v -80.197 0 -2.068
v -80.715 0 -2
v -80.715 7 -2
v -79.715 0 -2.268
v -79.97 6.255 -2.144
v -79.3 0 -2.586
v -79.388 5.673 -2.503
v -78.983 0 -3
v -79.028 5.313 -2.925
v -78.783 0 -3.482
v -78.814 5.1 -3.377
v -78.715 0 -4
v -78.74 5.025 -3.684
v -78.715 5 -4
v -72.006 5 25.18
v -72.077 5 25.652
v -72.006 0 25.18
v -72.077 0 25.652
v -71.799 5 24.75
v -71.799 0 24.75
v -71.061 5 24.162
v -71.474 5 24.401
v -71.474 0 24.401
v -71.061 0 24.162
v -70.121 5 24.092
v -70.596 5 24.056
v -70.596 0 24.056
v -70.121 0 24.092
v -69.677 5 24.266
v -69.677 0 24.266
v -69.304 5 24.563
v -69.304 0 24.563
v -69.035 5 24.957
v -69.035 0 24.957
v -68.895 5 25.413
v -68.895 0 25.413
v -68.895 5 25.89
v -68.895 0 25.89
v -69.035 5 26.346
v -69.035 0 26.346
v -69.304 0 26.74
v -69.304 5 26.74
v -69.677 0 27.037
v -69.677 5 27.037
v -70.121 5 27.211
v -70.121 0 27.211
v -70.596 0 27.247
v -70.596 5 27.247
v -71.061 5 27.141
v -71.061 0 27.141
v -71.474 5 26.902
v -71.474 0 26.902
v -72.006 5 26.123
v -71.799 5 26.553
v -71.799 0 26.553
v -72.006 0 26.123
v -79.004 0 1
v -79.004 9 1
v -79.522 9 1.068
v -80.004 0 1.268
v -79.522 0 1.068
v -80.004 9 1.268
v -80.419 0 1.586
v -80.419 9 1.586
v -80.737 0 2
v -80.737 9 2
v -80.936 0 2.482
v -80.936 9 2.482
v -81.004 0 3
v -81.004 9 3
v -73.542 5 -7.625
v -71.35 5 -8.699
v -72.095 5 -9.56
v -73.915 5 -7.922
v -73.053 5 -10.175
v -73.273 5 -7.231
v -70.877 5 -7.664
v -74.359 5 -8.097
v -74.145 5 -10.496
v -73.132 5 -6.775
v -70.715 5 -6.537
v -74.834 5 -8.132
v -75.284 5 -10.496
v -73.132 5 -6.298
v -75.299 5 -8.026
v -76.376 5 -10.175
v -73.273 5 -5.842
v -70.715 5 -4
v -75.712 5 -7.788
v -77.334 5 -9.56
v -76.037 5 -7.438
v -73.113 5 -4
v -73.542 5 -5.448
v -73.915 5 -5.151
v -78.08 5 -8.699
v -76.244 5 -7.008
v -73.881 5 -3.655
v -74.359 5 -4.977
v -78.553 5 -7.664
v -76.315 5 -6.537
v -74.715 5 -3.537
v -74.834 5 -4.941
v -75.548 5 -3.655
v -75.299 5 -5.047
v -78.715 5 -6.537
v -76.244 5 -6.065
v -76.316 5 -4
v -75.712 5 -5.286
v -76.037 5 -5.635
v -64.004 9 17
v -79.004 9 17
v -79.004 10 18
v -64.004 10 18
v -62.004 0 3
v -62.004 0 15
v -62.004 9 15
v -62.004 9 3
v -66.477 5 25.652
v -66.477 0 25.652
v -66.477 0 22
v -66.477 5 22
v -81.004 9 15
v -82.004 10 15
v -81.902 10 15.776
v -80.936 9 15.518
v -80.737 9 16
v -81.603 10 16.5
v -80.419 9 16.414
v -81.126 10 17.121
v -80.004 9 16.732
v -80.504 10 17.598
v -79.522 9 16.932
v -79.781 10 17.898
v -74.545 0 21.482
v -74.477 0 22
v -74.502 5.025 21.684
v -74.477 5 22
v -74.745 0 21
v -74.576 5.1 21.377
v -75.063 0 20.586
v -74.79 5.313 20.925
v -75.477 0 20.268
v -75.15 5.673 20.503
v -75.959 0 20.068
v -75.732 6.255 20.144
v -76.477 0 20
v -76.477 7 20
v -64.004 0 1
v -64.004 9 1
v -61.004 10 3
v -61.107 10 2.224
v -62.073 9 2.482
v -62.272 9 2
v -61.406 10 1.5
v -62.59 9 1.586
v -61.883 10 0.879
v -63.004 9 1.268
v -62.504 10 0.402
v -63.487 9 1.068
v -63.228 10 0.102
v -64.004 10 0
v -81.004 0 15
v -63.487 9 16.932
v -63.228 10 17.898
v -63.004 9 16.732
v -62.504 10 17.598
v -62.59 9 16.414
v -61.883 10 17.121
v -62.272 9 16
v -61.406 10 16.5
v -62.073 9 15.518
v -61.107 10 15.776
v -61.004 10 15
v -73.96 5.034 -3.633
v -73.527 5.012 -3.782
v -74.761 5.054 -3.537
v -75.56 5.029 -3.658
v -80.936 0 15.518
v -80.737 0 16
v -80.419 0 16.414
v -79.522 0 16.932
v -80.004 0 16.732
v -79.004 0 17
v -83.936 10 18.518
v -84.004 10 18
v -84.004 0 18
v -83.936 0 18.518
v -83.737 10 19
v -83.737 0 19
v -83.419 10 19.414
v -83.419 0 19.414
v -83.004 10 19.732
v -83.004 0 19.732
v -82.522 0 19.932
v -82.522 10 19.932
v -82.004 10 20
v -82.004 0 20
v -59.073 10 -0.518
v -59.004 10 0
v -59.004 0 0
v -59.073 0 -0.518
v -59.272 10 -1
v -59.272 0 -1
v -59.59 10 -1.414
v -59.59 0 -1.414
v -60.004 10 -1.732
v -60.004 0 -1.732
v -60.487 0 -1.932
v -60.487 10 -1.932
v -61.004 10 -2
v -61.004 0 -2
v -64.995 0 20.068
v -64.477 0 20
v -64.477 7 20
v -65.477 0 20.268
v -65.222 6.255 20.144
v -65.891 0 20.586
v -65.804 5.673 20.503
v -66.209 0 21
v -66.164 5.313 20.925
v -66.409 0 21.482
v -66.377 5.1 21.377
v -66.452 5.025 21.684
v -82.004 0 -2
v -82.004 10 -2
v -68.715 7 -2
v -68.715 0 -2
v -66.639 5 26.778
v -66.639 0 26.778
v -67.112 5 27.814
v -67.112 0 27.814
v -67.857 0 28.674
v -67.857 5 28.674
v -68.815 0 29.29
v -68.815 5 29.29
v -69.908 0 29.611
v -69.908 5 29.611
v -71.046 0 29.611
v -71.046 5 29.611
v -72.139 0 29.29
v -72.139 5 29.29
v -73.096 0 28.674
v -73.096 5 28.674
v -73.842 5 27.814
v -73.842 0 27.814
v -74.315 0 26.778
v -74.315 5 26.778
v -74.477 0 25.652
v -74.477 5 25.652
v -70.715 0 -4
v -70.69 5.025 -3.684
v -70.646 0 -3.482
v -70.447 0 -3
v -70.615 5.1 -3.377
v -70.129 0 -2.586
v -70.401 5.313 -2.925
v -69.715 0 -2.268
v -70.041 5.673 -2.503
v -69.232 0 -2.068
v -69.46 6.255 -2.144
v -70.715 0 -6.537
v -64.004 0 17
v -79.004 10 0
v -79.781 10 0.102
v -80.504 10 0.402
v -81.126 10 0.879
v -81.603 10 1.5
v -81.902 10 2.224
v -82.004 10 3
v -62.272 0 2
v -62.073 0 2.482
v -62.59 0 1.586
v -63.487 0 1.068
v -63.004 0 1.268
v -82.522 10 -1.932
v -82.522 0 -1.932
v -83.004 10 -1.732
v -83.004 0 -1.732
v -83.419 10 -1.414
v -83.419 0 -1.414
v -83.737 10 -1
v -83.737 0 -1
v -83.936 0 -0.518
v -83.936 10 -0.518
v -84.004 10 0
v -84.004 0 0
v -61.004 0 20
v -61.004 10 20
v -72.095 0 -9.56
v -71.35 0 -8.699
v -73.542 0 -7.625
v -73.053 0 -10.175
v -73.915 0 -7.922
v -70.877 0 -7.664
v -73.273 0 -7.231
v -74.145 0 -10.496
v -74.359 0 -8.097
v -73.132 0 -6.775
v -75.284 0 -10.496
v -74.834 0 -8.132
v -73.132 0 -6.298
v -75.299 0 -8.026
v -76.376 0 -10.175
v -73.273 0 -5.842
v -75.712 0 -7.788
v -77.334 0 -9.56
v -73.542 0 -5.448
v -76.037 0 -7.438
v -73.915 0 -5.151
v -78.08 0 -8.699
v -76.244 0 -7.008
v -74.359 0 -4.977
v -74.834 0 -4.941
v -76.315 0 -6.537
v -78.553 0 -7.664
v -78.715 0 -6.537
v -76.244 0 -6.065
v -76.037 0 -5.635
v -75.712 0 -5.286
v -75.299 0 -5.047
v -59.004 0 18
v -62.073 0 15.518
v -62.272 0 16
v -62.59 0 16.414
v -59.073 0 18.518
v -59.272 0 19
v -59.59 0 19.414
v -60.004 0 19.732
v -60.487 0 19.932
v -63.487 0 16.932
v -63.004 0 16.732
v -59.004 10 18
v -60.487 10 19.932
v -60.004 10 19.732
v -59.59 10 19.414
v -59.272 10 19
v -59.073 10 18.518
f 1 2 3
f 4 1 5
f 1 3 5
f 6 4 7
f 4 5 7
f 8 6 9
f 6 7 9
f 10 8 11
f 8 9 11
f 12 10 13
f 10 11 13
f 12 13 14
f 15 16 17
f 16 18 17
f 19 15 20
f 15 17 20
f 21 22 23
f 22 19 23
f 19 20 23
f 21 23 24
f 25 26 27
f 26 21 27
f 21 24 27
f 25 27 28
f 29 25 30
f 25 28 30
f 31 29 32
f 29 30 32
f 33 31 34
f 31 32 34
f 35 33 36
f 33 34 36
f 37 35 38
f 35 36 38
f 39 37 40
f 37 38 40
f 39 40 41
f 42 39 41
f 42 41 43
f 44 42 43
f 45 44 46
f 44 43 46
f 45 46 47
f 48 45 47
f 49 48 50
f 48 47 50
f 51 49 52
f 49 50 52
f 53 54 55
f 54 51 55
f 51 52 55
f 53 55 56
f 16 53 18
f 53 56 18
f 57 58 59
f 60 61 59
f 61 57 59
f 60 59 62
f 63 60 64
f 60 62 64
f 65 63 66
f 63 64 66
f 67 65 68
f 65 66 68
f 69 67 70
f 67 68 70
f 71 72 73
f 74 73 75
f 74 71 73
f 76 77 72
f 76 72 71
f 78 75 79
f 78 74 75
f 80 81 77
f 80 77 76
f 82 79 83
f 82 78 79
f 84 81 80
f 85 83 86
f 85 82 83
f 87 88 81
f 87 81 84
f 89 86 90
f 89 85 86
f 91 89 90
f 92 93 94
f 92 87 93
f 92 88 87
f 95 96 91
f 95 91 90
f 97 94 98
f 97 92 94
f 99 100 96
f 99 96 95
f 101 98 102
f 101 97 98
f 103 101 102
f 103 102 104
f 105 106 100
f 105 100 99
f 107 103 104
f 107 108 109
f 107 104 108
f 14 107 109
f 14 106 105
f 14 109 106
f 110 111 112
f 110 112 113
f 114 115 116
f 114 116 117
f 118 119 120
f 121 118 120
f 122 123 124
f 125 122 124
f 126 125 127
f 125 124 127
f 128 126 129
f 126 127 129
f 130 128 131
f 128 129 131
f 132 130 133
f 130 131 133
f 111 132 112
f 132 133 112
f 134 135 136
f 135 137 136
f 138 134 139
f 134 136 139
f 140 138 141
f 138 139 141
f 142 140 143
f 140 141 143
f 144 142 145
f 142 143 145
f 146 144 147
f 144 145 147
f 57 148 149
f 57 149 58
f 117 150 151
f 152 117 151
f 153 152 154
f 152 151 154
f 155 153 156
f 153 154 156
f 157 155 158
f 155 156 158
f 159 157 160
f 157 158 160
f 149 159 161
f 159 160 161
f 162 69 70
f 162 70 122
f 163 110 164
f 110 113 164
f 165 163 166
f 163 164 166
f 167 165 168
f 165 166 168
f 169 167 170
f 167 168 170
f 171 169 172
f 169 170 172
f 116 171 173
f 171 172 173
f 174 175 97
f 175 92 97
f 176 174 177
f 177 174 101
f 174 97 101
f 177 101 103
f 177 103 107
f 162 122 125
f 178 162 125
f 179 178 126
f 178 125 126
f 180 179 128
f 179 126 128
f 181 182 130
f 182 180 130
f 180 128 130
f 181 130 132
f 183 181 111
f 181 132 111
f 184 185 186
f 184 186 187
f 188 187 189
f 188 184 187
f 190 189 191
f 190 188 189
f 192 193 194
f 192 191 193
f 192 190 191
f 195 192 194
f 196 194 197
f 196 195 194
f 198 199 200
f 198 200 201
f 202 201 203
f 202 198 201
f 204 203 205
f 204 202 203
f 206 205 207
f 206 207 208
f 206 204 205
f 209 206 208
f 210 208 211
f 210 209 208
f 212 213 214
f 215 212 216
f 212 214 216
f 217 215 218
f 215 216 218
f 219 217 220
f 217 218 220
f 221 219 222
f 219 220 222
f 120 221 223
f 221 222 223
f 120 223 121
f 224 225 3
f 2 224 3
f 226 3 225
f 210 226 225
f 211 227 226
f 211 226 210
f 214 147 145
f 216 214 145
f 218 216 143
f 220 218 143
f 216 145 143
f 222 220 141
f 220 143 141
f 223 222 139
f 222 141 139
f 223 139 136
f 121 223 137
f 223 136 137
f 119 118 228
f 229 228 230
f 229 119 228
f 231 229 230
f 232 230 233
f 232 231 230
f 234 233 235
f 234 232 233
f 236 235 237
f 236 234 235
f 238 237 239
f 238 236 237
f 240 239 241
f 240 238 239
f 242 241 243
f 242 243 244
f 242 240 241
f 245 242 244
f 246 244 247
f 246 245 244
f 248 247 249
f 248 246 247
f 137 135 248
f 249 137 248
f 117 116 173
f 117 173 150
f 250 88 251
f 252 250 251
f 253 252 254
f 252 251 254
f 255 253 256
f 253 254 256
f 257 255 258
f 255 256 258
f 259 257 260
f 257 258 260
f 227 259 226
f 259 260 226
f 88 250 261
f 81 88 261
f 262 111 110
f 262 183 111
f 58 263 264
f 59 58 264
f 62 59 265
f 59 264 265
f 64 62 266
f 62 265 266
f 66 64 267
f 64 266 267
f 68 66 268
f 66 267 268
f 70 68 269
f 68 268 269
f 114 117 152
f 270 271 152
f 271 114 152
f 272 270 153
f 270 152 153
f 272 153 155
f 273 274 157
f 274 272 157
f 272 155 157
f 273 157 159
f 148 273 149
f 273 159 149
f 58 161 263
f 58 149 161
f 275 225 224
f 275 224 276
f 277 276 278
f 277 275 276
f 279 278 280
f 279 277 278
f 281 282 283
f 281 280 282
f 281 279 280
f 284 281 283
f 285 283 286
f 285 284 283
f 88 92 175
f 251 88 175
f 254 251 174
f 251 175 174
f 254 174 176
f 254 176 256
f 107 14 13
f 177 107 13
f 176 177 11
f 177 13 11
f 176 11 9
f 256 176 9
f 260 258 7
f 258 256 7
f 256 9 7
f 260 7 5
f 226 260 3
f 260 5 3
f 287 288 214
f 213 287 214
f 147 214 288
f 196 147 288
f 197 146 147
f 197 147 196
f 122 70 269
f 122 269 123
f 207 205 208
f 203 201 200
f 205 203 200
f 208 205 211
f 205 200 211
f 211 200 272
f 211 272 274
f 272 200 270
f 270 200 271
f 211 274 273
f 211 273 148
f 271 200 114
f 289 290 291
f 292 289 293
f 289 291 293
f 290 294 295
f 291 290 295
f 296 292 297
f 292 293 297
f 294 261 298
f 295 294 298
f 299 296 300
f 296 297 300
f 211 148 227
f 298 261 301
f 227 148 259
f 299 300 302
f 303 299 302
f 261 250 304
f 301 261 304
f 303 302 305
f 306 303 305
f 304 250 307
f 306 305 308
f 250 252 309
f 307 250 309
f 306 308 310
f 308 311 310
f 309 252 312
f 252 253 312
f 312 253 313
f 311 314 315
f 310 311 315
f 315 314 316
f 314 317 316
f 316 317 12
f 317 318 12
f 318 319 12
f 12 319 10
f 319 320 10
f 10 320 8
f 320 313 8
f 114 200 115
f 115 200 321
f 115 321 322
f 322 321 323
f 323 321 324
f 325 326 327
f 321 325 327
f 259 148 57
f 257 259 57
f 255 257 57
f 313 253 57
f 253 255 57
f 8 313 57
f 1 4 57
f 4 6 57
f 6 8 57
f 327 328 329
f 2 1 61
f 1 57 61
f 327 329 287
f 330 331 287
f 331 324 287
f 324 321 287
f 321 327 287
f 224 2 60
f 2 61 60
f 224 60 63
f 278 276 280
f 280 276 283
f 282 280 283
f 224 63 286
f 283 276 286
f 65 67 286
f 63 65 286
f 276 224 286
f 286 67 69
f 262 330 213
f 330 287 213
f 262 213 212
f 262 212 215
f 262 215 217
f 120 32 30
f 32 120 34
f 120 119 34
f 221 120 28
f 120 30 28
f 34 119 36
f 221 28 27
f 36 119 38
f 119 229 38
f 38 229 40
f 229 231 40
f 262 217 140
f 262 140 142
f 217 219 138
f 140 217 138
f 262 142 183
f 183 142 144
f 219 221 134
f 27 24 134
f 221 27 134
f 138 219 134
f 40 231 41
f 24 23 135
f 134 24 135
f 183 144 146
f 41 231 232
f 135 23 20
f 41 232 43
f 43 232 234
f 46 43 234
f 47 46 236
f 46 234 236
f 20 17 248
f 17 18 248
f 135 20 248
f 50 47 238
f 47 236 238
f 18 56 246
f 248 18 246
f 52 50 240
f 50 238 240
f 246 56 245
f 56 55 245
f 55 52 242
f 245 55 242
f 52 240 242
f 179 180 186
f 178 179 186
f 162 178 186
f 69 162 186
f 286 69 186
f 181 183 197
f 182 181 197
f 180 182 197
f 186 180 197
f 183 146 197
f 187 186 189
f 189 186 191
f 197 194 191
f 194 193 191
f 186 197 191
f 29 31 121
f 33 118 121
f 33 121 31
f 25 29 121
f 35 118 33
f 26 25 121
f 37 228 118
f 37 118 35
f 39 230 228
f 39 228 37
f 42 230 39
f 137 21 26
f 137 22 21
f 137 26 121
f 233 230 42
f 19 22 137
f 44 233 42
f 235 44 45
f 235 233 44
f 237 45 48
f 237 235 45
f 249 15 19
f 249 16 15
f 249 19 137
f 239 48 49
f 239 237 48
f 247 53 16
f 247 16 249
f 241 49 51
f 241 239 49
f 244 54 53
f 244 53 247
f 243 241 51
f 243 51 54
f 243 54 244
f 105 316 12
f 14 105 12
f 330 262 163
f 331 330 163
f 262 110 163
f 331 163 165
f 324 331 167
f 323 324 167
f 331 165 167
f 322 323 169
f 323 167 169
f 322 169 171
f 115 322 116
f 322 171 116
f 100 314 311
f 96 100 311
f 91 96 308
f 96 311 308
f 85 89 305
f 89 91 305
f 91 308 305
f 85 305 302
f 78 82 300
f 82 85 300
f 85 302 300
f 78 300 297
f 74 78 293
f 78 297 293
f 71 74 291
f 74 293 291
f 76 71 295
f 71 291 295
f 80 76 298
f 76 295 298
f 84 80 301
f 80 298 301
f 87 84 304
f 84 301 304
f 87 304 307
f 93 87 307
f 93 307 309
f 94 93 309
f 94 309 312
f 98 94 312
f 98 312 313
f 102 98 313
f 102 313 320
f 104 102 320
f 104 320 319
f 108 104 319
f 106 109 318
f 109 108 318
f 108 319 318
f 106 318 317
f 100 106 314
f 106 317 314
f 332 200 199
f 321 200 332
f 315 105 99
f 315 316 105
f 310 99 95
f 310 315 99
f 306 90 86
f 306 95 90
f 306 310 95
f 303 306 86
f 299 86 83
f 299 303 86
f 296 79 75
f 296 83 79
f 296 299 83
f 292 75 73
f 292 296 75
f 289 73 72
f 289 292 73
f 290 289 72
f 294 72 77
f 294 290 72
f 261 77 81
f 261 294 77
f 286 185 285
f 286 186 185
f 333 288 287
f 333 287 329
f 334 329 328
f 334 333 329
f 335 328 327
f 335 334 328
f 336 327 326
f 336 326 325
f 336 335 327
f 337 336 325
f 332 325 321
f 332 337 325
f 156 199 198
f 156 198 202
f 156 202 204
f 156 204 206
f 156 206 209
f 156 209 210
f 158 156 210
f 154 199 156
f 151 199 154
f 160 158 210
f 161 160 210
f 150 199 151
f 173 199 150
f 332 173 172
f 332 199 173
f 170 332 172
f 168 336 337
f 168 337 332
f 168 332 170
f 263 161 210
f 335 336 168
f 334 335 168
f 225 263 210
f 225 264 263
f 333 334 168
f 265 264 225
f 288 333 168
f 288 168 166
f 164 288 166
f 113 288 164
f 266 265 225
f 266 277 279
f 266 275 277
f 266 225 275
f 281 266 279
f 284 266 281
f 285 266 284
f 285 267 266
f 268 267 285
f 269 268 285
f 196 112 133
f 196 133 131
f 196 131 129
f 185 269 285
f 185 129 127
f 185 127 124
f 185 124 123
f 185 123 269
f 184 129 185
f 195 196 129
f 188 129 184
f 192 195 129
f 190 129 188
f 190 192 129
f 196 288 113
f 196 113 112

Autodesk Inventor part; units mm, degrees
ref_plane "YZ Plane" through (0, 0, 0) normal (1, 0, 0) x (0, 1, 0)
ref_plane "XZ Plane" through (0, 0, 0) normal (0, 1, 0) x (-1, 0, 0)
ref_plane "XY Plane" through (0, 0, 0) normal (0, 0, 1) x (1, 0, 0)
sketch "Skizze1" plane through (0, 0, 0) normal (0, 1, 0) x (-1, 0, 0)
  line L0 (19.0016, 59.2215) -> (57.3401, 24.0908)
  arc A0 (57.3401, 24.0908) -> (69.3003, 22.9246) centre (64.096, 31.4636) ccw
  arc A1 (75.2406, 20.5635) -> (69.3003, 22.9246) centre (71.3821, 19.509) ccw
  arc A2 (77.999, -0.3892) -> (75.2406, 20.5635) centre (0, 0) ccw
  arc A3 (72.8723, -4.2072) -> (77.999, -0.3892) centre (73.9991, -0.3692) ccw
  arc A4 (72.8723, -4.2072) -> (61.6214, -8.4293) centre (70.0553, -13.8022) ccw
  line L1 (61.6214, -8.4293) -> (37.5911, -46.1492)
  arc A5 (34.2176, -48) -> (37.5911, -46.1492) centre (34.2176, -44) ccw
  line L2 (34.2176, -48) -> (29, -48)
  arc A6 (29, -48) -> (25.0078, -51.75) centre (29, -52) ccw
  arc A7 (21.0156, -55.5) -> (25.0078, -51.75) centre (21.0156, -51.5) ccw
  line L3 (21.0156, -55.5) -> (-21.0156, -55.5)
  circle A8 centre (36.75, -68) radius 1.8
  circle A9 centre (36.75, -61) radius 1.8
  circle A10 centre (36.75, -54) radius 1.8
  line L4 (30.1812, 62.5407) -> (59.6723, 35.5171)
  arc A11 (59.6723, 35.5171) -> (68.1495, 35.8873) centre (63.7258, 39.9408) ccw
  line L5 (68.1495, 35.8873) -> (74.1043, 42.3858)
  arc A12 (77.3365, 41.9889) -> (74.1043, 42.3858) centre (75.5788, 41.0346) ccw
  arc A13 (85.5688, -20.542) -> (77.3365, 41.9889) centre (0, 0) ccw
  arc A14 (82.5495, -21.7619) -> (85.5688, -20.542) centre (83.6241, -20.0751) ccw
  line L6 (82.5495, -21.7619) -> (75.1157, -17.026)
  arc A15 (75.1157, -17.026) -> (66.8315, -18.8626) centre (71.8919, -22.0864) ccw
  line L7 (66.8315, -18.8626) -> (45.3395, -52.5983)
  arc A16 (45.3395, -52.5983) -> (47.1761, -60.8824) centre (50.3999, -55.8221) ccw
  line L8 (47.1761, -60.8824) -> (54.6099, -65.6183)
  arc A17 (54.7803, -68.8703) -> (54.6099, -65.6183) centre (53.5353, -67.3051) ccw
  arc A18 (44.8368, -75.7209) -> (54.7803, -68.8703) centre (0, 0) ccw
  arc A19 (43.8178, -76) -> (44.8368, -75.7209) centre (43.8178, -74) ccw
  line L9 (43.8178, -76) -> (35.75, -76)
  arc A20 (33.75, -74) -> (35.75, -76) centre (35.75, -74) ccw
  line L10 (33.75, -74) -> (33.75, -64)
  arc A21 (33.75, -64) -> (30.0179, -63) centre (31.75, -64) ccw
  arc A22 (28.2859, -64) -> (30.0179, -63) centre (28.2859, -62) ccw
  line L11 (28.2859, -64) -> (14.7321, -64)
  circle A23 centre (49.9686, 39.6617) radius 1.8
  circle A24 centre (55.4982, 34.5948) radius 1.8
  circle A25 centre (58.5312, -25.3775) radius 1.8
  circle A26 centre (54.5014, -31.7029) radius 1.8
  circle A27 centre (62.5609, -19.052) radius 1.8
  line L12 (37.1695, -45.8805) -> (61.1997, -8.1606)
  arc A28 (73.0131, -3.7275) -> (61.1997, -8.1606) centre (70.0553, -13.8022) ccw
  arc A29 (73.0131, -3.7275) -> (77.499, -0.3867) centre (73.9991, -0.3692) ccw
  arc A30 (77.499, -0.3867) -> (74.7582, 20.4317) centre (0, 0) ccw
  arc A31 (74.7582, 20.4317) -> (69.5605, 22.4976) centre (71.3821, 19.509) ccw
  arc A32 (57.0023, 23.7222) -> (69.5605, 22.4976) centre (64.096, 31.4636) ccw
  line L13 (57.0023, 23.7222) -> (18.6638, 58.8529)
  line L14 (-21.0156, -55) -> (21.0156, -55)
  arc A33 (21.0156, -55) -> (24.5088, -51.7188) centre (21.0156, -51.5) ccw
  arc A34 (29, -47.5) -> (24.5088, -51.7188) centre (29, -52) ccw
  line L15 (29, -47.5) -> (34.2176, -47.5)
  arc A35 (34.2176, -47.5) -> (37.1695, -45.8805) centre (34.2176, -44) ccw
  line L16 (47.604, 37.0813) -> (31.5682, 51.7754)
  line L17 (31.5682, 51.7754) -> (63.6398, 22.3872)
  line L18 (63.6398, 22.3872) -> (50.128, 7.6416)
  line L19 (47.3023, 7.5183) -> (18.1798, 34.2041)
  line L20 (18.0564, 37.0298) -> (31.5682, 51.7754)
  line L21 (58.5312, -25.3775) -> (55.5793, -23.4969)
  line L22 (55.5793, -23.4969) -> (67.2656, -5.1532)
  line L23 (67.2656, -5.1532) -> (43.893, -41.8407)
  line L24 (43.893, -41.8407) -> (27.0252, -31.0947)
  line L25 (26.413, -28.3333) -> (47.6364, 4.9806)
  line L26 (50.3977, 5.5928) -> (67.2656, -5.1532)
  arc A36 (50.3977, 5.5928) -> (47.6364, 4.9806) centre (49.3231, 3.906) ccw
  arc A37 (47.3023, 7.5183) -> (50.128, 7.6416) centre (48.6535, 8.9928) ccw
  arc A38 (26.413, -28.3333) -> (27.0252, -31.0947) centre (28.0998, -29.4079) ccw
  line L27 (81.0045, 17) -> (62.0045, 17)
  line L28 (62.0045, 17) -> (62.0045, 1)
  line L29 (62.0045, 1) -> (81.0045, 1)
  line L30 (81.0045, 1) -> (81.0045, 17)
  line L31 (81.0045, 17) -> (62.0045, 1) construction
  line L32 (62.0045, 17) -> (81.0045, 1) construction
  arc A39 (-37.5911, -46.1492) -> (-34.2176, -48) centre (-34.2176, -44) ccw
  line L33 (-37.5911, -46.1492) -> (-61.6214, -8.4293)
  arc A40 (-61.6214, -8.4293) -> (-72.8723, -4.2072) centre (-70.0553, -13.8022) ccw
  arc A41 (-77.999, -0.3892) -> (-72.8723, -4.2072) centre (-73.9991, -0.3692) ccw
  arc A42 (-75.2406, 20.5635) -> (-77.999, -0.3892) centre (0, 0) ccw
  arc A43 (-69.3003, 22.9246) -> (-75.2406, 20.5635) centre (-71.3821, 19.509) ccw
  arc A44 (-69.3003, 22.9246) -> (-57.3401, 24.0908) centre (-64.096, 31.4636) ccw
  line L34 (-57.3401, 24.0908) -> (-19.0016, 59.2215)
  arc A45 (-19.0016, 59.2215) -> (-16.7974, 71.0346) centre (-25.7575, 66.5943) ccw
  arc A46 (-13.9276, 76.7465) -> (-16.7974, 71.0346) centre (-13.2134, 72.8108) ccw
  arc A47 (13.9276, 76.7465) -> (-13.9276, 76.7465) centre (0, 0) ccw
  arc A48 (16.7974, 71.0346) -> (13.9276, 76.7465) centre (13.2134, 72.8108) ccw
  arc A49 (16.7974, 71.0346) -> (19.0016, 59.2215) centre (25.7575, 66.5943) ccw
  line L35 (19.0016, 59.2215) -> (57.3401, 24.0908)
  arc A50 (57.3401, 24.0908) -> (69.3003, 22.9246) centre (64.096, 31.4636) ccw
  arc A51 (75.2406, 20.5635) -> (69.3003, 22.9246) centre (71.3821, 19.509) ccw
  arc A52 (77.999, -0.3892) -> (75.2406, 20.5635) centre (0, 0) ccw
  arc A53 (72.8723, -4.2072) -> (77.999, -0.3892) centre (73.9991, -0.3692) ccw
  arc A54 (72.8723, -4.2072) -> (61.6214, -8.4293) centre (70.0553, -13.8022) ccw
  line L36 (61.6214, -8.4293) -> (37.5911, -46.1492)
  arc A55 (34.2176, -48) -> (37.5911, -46.1492) centre (34.2176, -44) ccw
  line L37 (34.2176, -48) -> (29, -48)
  arc A56 (29, -48) -> (25.0078, -51.75) centre (29, -52) ccw
  arc A57 (21.0156, -55.5) -> (25.0078, -51.75) centre (21.0156, -51.5) ccw
  line L38 (21.0156, -55.5) -> (-21.0156, -55.5)
  arc A58 (-25.0078, -51.75) -> (-21.0156, -55.5) centre (-21.0156, -51.5) ccw
  arc A59 (-25.0078, -51.75) -> (-29, -48) centre (-29, -52) ccw
  line L39 (-29, -48) -> (-34.2176, -48)
  circle A60 centre (-24.9586, 79.1585) radius 2.8
  circle A61 centre (-76.682, 31.7627) radius 2.8
  circle A62 centre (-82.2899, -10.8337) radius 2.8
  circle A63 centre (-36.75, -68) radius 1.8
  circle A64 centre (-36.75, -61) radius 1.8
  circle A65 centre (-36.75, -54) radius 1.8
  circle A66 centre (-49.9686, 39.6617) radius 1.8
  circle A67 centre (-55.4982, 34.5948) radius 1.8
  circle A68 centre (-44.439, 44.7287) radius 1.8
  circle A69 centre (-62.5609, -19.052) radius 1.8
  circle A70 centre (-54.5014, -31.7029) radius 1.8
  circle A71 centre (-58.5312, -25.3775) radius 1.8
  circle A72 centre (36.75, -68) radius 1.8
  circle A73 centre (36.75, -61) radius 1.8
  circle A74 centre (36.75, -54) radius 1.8
  circle A75 centre (82.2899, -10.8337) radius 2.8
  circle A76 centre (76.682, 31.7627) radius 2.8
  circle A77 centre (24.9586, 79.1585) radius 2.8
  arc A78 (29.8111, 71.018) -> (30.1812, 62.5407) centre (34.2347, 66.9644) ccw
  line L40 (30.1812, 62.5407) -> (59.6723, 35.5171)
  arc A79 (59.6723, 35.5171) -> (68.1495, 35.8873) centre (63.7258, 39.9408) ccw
  line L41 (68.1495, 35.8873) -> (74.1043, 42.3858)
  arc A80 (77.3365, 41.9889) -> (74.1043, 42.3858) centre (75.5788, 41.0346) ccw
  arc A81 (85.5688, -20.542) -> (77.3365, 41.9889) centre (0, 0) ccw
  arc A82 (82.5495, -21.7619) -> (85.5688, -20.542) centre (83.6241, -20.0751) ccw
  line L42 (82.5495, -21.7619) -> (75.1157, -17.026)
  arc A83 (75.1157, -17.026) -> (66.8315, -18.8626) centre (71.8919, -22.0864) ccw
  line L43 (66.8315, -18.8626) -> (45.3395, -52.5983)
  arc A84 (45.3395, -52.5983) -> (47.1761, -60.8824) centre (50.3999, -55.8221) ccw
  line L44 (47.1761, -60.8824) -> (54.6099, -65.6183)
  arc A85 (54.7803, -68.8703) -> (54.6099, -65.6183) centre (53.5353, -67.3051) ccw
  arc A86 (44.8368, -75.7209) -> (54.7803, -68.8703) centre (0, 0) ccw
  arc A87 (43.8178, -76) -> (44.8368, -75.7209) centre (43.8178, -74) ccw
  line L45 (43.8178, -76) -> (35.75, -76)
  arc A88 (33.75, -74) -> (35.75, -76) centre (35.75, -74) ccw
  line L46 (33.75, -74) -> (33.75, -64)
  arc A89 (33.75, -64) -> (30.0179, -63) centre (31.75, -64) ccw
  arc A90 (28.2859, -64) -> (30.0179, -63) centre (28.2859, -62) ccw
  line L47 (28.2859, -64) -> (14.7321, -64)
  arc A91 (13, -63) -> (14.7321, -64) centre (14.7321, -62) ccw
  line L48 (-14.7321, -64) -> (-28.2859, -64)
  arc A92 (-30.0179, -63) -> (-28.2859, -64) centre (-28.2859, -62) ccw
  arc A93 (-30.0179, -63) -> (-33.75, -64) centre (-31.75, -64) ccw
  line L49 (-33.75, -64) -> (-33.75, -74)
  arc A94 (-35.75, -76) -> (-33.75, -74) centre (-35.75, -74) ccw
  line L50 (-35.75, -76) -> (-43.8178, -76)
  arc A95 (-44.8368, -75.7209) -> (-43.8178, -76) centre (-43.8178, -74) ccw
  arc A96 (-54.7803, -68.8703) -> (-44.8368, -75.7209) centre (0, 0) ccw
  arc A97 (-54.6099, -65.6183) -> (-54.7803, -68.8703) centre (-53.5353, -67.3051) ccw
  line L51 (-54.6099, -65.6183) -> (-47.1761, -60.8824)
  arc A98 (-47.1761, -60.8824) -> (-45.3395, -52.5983) centre (-50.3999, -55.8221) ccw
  line L52 (-45.3395, -52.5983) -> (-66.8315, -18.8626)
  arc A99 (-66.8315, -18.8626) -> (-75.1157, -17.026) centre (-71.8919, -22.0864) ccw
  line L53 (-75.1157, -17.026) -> (-82.5495, -21.7619)
  arc A100 (-85.5688, -20.542) -> (-82.5495, -21.7619) centre (-83.6241, -20.0751) ccw
  arc A101 (-77.3365, 41.9889) -> (-85.5688, -20.542) centre (0, 0) ccw
  arc A102 (-74.1043, 42.3858) -> (-77.3365, 41.9889) centre (-75.5788, 41.0346) ccw
  line L54 (-74.1043, 42.3858) -> (-68.1495, 35.8873)
  arc A103 (-68.1495, 35.8873) -> (-59.6723, 35.5171) centre (-63.7258, 39.9408) ccw
  line L55 (-59.6723, 35.5171) -> (-30.1812, 62.5407)
  arc A104 (-30.1812, 62.5407) -> (-29.8111, 71.018) centre (-34.2347, 66.9644) ccw
  line L56 (-29.8111, 71.018) -> (-35.7659, 77.5165)
  arc A105 (-35.0888, 80.7018) -> (-35.7659, 77.5165) centre (-34.2913, 78.8676) ccw
  arc A106 (35.0888, 80.7018) -> (-35.0888, 80.7018) centre (0, 0) ccw
  arc A107 (35.7659, 77.5165) -> (35.0888, 80.7018) centre (34.2913, 78.8676) ccw
  line L57 (35.7659, 77.5165) -> (29.8111, 71.018)
  circle A108 centre (49.9686, 39.6617) radius 1.8
  circle A109 centre (55.4982, 34.5948) radius 1.8
  circle A110 centre (58.5312, -25.3775) radius 1.8
  circle A111 centre (54.5014, -31.7029) radius 1.8
  circle A112 centre (44.439, 44.7287) radius 1.8
  circle A113 centre (62.5609, -19.052) radius 1.8
  line L58 (37.1695, -45.8805) -> (61.1997, -8.1606)
  arc A114 (73.0131, -3.7275) -> (61.1997, -8.1606) centre (70.0553, -13.8022) ccw
  arc A115 (73.0131, -3.7275) -> (77.499, -0.3867) centre (73.9991, -0.3692) ccw
  arc A116 (77.499, -0.3867) -> (74.7582, 20.4317) centre (0, 0) ccw
  arc A117 (74.7582, 20.4317) -> (69.5605, 22.4976) centre (71.3821, 19.509) ccw
  arc A118 (57.0023, 23.7222) -> (69.5605, 22.4976) centre (64.096, 31.4636) ccw
  line L59 (57.0023, 23.7222) -> (18.6638, 58.8529)
  arc A119 (16.3494, 71.2566) -> (18.6638, 58.8529) centre (25.7575, 66.5943) ccw
  arc A120 (16.3494, 71.2566) -> (13.8384, 76.2545) centre (13.2134, 72.8108) ccw
  arc A121 (13.8384, 76.2545) -> (-13.8384, 76.2545) centre (0, 0) ccw
  arc A122 (-13.8384, 76.2545) -> (-16.3494, 71.2566) centre (-13.2134, 72.8108) ccw
  arc A123 (-18.6638, 58.8529) -> (-16.3494, 71.2566) centre (-25.7575, 66.5943) ccw
  line L60 (-18.6638, 58.8529) -> (-57.0023, 23.7222)
  arc A124 (-69.5605, 22.4976) -> (-57.0023, 23.7222) centre (-64.096, 31.4636) ccw
  arc A125 (-69.5605, 22.4976) -> (-74.7582, 20.4317) centre (-71.3821, 19.509) ccw
  arc A126 (-74.7582, 20.4317) -> (-77.499, -0.3867) centre (0, 0) ccw
  arc A127 (-77.499, -0.3867) -> (-73.0131, -3.7275) centre (-73.9991, -0.3692) ccw
  arc A128 (-61.1997, -8.1606) -> (-73.0131, -3.7275) centre (-70.0553, -13.8022) ccw
  line L61 (-61.1997, -8.1606) -> (-37.1695, -45.8805)
  arc A129 (-37.1695, -45.8805) -> (-34.2176, -47.5) centre (-34.2176, -44) ccw
  line L62 (-34.2176, -47.5) -> (-29, -47.5)
  arc A130 (-24.5088, -51.7188) -> (-29, -47.5) centre (-29, -52) ccw
  arc A131 (-24.5088, -51.7188) -> (-21.0156, -55) centre (-21.0156, -51.5) ccw
  line L63 (-21.0156, -55) -> (21.0156, -55)
  arc A132 (21.0156, -55) -> (24.5088, -51.7188) centre (21.0156, -51.5) ccw
  arc A133 (29, -47.5) -> (24.5088, -51.7188) centre (29, -52) ccw
  line L64 (29, -47.5) -> (34.2176, -47.5)
  arc A134 (34.2176, -47.5) -> (37.1695, -45.8805) centre (34.2176, -44) ccw
  circle A135 centre (16, 9) radius 2.1
  line L65 (-19, -53) -> (-19, 12)
  circle A136 centre (4, 47) radius 1.621
  circle A137 centre (-4, 47) radius 1.621
  arc A138 (7, 49.9161) -> (10.3333, 45.972) centre (11, 49.9161) ccw
  arc A139 (12, 44) -> (10.3333, 45.972) centre (10, 44) ccw
  line L66 (12, 44) -> (12, -5)
  line L67 (12, -5) -> (10, -5)
  arc A140 (8, -3) -> (10, -5) centre (10, -3) ccw
  line L68 (8, -3) -> (8, 1)
  arc A141 (8, 1) -> (6, 3) centre (6, 1) ccw
  line L69 (6, 3) -> (-6, 3)
  arc A142 (-6, 3) -> (-8, 1) centre (-6, 1) ccw
  line L70 (-8, 1) -> (-8, -3)
  arc A143 (-10, -5) -> (-8, -3) centre (-10, -3) ccw
  line L71 (-10, -5) -> (-12, -5)
  line L72 (-12, -5) -> (-12, 44)
  arc A144 (-10.3333, 45.972) -> (-12, 44) centre (-10, 44) ccw
  arc A145 (-10.3333, 45.972) -> (-7, 49.9161) centre (-11, 49.9161) ccw
  line L73 (-7, 49.9161) -> (-7, 54)
  arc A146 (-5, 56) -> (-7, 54) centre (-5, 54) ccw
  line L74 (-5, 56) -> (5, 56)
  arc A147 (7, 54) -> (5, 56) centre (5, 54) ccw
  line L75 (7, 54) -> (7, 49.9161)
  line L76 (-13, -63) -> (13, -63) construction
  line L77 (0, -63) -> (0, 88) construction
  arc A148 (35.0888, 80.7018) -> (-35.0888, 80.7018) centre (0, 0) ccw construction
  line L78 (0, 0) -> (88, 0) construction
  arc A149 (85.5688, -20.542) -> (77.3365, 41.9889) centre (0, 0) ccw construction
  circle A150 centre (0, 0) radius 75 construction
  line L79 (0, 0) -> (70.4769, 25.6515) construction
  line L80 (0, 0) -> (74.7146, -6.5367) construction
  circle A151 centre (0, 0) radius 78
  circle A152 centre (70.4769, 25.6515) radius 3
  circle A153 centre (74.7146, -6.5367) radius 3
  circle A154 centre (0, 0) radius 72
  arc A155 (29, -48) -> (25.0078, -51.75) centre (29, -52) ccw construction
  circle A156 centre (29, -52) radius 3.5
  line L81 (34.2176, -48) -> (29, -48) construction
  line L82 (29, -55.5) -> (21.0156, -55.5)
  circle A157 centre (29, -52) radius 4
  line L83 (32.5, -48) -> (29, -48)
  arc A158 (21.0156, -55.5) -> (25.0078, -51.75) centre (21.0156, -51.5) ccw
  arc A159 (21.0156, -55.5) -> (25.0078, -51.75) centre (21.0156, -51.5) ccw
  line L84 (32.5, -52) -> (32.5, -48)
  circle A160 centre (74.7146, -6.5367) radius 1.6
  circle A161 centre (70.4769, 25.6515) radius 1.6
  circle A162 centre (29, -52) radius 1.6
  line L85 (0, -55.5) -> (0, 88)
  line L86 (84.0045, -2) -> (59.0045, -2)
  line L87 (59.0045, -2) -> (59.0045, 20)
  line L88 (59.0045, 20) -> (84.0045, 20)
  line L89 (84.0045, 20) -> (84.0045, -2)
  circle A163 centre (82.2899, -10.8337) radius 4
  line L90 (74.7146, -6.5367) -> (74.7146, 9.8771) construction
  line L91 (78.7146, -6.5367) -> (78.7146, 9.8771)
  line L92 (70.7146, 9.8771) -> (70.7146, -6.5367)
  arc A164 (70.7146, -6.5367) -> (78.7146, -6.5367) centre (74.7146, -6.5367) ccw
  arc A165 (78.7146, 9.8771) -> (70.7146, 9.8771) centre (74.7146, 9.8771) ccw
  line L93 (70.4769, 25.6515) -> (70.4769, 13.0481) construction
  line L94 (66.4769, 25.6515) -> (66.4769, 13.0481)
  line L95 (74.4769, 13.0481) -> (74.4769, 25.6515)
  arc A166 (74.4769, 25.6515) -> (66.4769, 25.6515) centre (70.4769, 25.6515) ccw
  arc A167 (66.4769, 13.0481) -> (74.4769, 13.0481) centre (70.4769, 13.0481) ccw
  point P0 (0, 0)
  point P1 (0, 0)
  point P2 (216.3011, -305.5849)
  point P3 (183.0204, -305.5849)
  point P4 (184.3011, -305.5849)
  point P5 (215.0204, -305.5849)
  point P6 (48.7768, 6.1671)
  point P7 (25.3384, -30.0201)
  point P8 (0, 0)
  point P9 (0, 0)
  point P10 (357.611, -164.2236)
  point P11 (324.3303, -164.2236)
  point P12 (325.611, -164.2236)
  point P13 (356.3303, -164.2236)
  point P14 (0, -5)
  point P15 (0, 56)
  point P16 (496.1935, -138.8477)
  point P17 (490.2163, -138.3247)
  point P18 (494.6235, -171.8005)
  point P19 (500.2617, -169.7483)
  point P20 (538.9195, -97.1229)
  point P21 (542.9117, -93.3729)
  point P22 (414.2667, -82.5461)
  point P23 (408.6285, -84.5982)
  point P24 (409.3834, -86.7803)
  point P25 (361.9863, -164.7236)
  point P26 (373.4707, -157.2236)
  point P27 (412.861, -113.1957)
  point P28 (412.6967, -115.4989)
  point P29 (418.6738, -116.0218)
  point P30 (418.9697, -109.6128)
  point P31 (416.2112, -88.6601)
  point P32 (340.9707, -31.2236)
  point P33 (340.9707, -53.2236)
  point P34 (340.9707, -97.2236)
  point P35 (340.9707, -100.2236)
  point P36 (340.9707, -164.7236)
  point P37 (74.7146, 1.6702)
  point P38 (70.4769, 19.3498)
  point P39 (70.7146, -2)
  point P40 (78.7146, -2)
  point P41 (66.4769, 20)
  point P42 (74.4769, 20)
  dimension "d0" = 0.5
  dimension "d1" = 43.5
  dimension "d2" = 22
  dimension "d3" = 3.5
  dimension "d4" = 21.75
  dimension "d5" = 43.5
  dimension "d6" = 22
  dimension "d7" = 2
  dimension "d8" = 19
  dimension "d9" = 16
  dimension "d10" = 1
  dimension "d11" = 0.5
  dimension "d20" = 4.2
  dimension "d23" = 65
  dimension "d26" = 150
  dimension "d27" = 20
  dimension "d28" = 5
  dimension "d29" = 156
  dimension "d30" = 6
  dimension "d31" = 6
  dimension "d32" = 7
  dimension "d33" = 4
  dimension "d34" = 3.2
  dimension "d35" = 3.2
  dimension "d36" = 3.2
  dimension "d37" = 3
  dimension "d38" = 8
  dimension "d39" = 8
  dimension "d40" = 8
extrude "Extrusion1" add sketch "Skizze1" along normal blind 10 contours L88 L94 L27 L28 L29 L92 L86 L26 L87 L18 | L18 L87 L88 | L88 A154 L27 L94 | L88 L95 L27 A154 | L26 L86 L87 | L88 A30 L27 L95 | L88 A2 L27 A30 | L92 L29 A154 L86 | L88 L89 L86 L91 L29 L30 L27 A2 | A154 L29 A30 A29 L86 | A29 A30 L29 A2 A3 L86 | A3 A151 L86 | L29 L91 L86 A151 A2
extrude "Extrusion2" add sketch "Skizze1" along normal blind 5 contours L94 A166 A154 A0 | A0 A154 A32 L94 | A166 A151 A152 A154 | A154 A152 A0 | A0 A152 A31 A32 A154 | A32 A154 L88 L94 | A152 A1 A0 | A166 L95 A151 | A0 A1 A152 A31 | A32 A31 A152 L95 L88 A154 | A151 L95 A1 A152 | A31 A152 | A1 L95 A31 A152 | L86 A154 A28 L92 | A28 A154 A4 L92 | L86 A29 A153 A28 A154 | A28 A29 A153 A4 A154 | A4 A154 A164 L92 | L86 A3 A153 A29 | A164 A154 A153 A151 | A151 L86 L91 A164 | A4 A153 A154 | A153 A3 A4 A29 | A29 A153 | L86 A151 A153 A3 | A153 A4 A3
fillet "Rundung1" radius 2 6 edges at (-70.4769, 5, 20) (-66.4769, 2.5, 20) (-74.4769, 2.5, 20) (-70.7146, 2.5, -2) (-74.7146, 5, -2) (-78.7146, 2.5, -2)
fillet "Rundung2" radius 2 8 edges at (-59.0045, 5, 20) (-59.0045, 5, -2) (-84.0045, 5, 20) (-84.0045, 5, -2) (-81.0045, 5, 1) (-81.0045, 5, 17) (-62.0045, 5, 1) (-62.0045, 5, 17)
chamfer "Fasen1" distance 1 angle 45 4 edges at (-71.5045, 10, 1) (-62.0045, 10, 9) (-71.5045, 10, 17) (-81.0045, 10, 9)
sketch "Skizze2" plane through (0, 5, 0) normal (0, 1, 0) x (1, 0, 0)
  circle A0 centre (-74.7146, 6.5367) radius 1.6 projected
  circle A1 centre (-74.7146, 6.5367) radius 3
  point P0 (0, 0)
  dimension "d50" = 6
extrude "Extrusion3" cut sketch "Skizze2" along normal blind 10 contours A0 | A1
properties part number "SchussAkkuHalterung"
